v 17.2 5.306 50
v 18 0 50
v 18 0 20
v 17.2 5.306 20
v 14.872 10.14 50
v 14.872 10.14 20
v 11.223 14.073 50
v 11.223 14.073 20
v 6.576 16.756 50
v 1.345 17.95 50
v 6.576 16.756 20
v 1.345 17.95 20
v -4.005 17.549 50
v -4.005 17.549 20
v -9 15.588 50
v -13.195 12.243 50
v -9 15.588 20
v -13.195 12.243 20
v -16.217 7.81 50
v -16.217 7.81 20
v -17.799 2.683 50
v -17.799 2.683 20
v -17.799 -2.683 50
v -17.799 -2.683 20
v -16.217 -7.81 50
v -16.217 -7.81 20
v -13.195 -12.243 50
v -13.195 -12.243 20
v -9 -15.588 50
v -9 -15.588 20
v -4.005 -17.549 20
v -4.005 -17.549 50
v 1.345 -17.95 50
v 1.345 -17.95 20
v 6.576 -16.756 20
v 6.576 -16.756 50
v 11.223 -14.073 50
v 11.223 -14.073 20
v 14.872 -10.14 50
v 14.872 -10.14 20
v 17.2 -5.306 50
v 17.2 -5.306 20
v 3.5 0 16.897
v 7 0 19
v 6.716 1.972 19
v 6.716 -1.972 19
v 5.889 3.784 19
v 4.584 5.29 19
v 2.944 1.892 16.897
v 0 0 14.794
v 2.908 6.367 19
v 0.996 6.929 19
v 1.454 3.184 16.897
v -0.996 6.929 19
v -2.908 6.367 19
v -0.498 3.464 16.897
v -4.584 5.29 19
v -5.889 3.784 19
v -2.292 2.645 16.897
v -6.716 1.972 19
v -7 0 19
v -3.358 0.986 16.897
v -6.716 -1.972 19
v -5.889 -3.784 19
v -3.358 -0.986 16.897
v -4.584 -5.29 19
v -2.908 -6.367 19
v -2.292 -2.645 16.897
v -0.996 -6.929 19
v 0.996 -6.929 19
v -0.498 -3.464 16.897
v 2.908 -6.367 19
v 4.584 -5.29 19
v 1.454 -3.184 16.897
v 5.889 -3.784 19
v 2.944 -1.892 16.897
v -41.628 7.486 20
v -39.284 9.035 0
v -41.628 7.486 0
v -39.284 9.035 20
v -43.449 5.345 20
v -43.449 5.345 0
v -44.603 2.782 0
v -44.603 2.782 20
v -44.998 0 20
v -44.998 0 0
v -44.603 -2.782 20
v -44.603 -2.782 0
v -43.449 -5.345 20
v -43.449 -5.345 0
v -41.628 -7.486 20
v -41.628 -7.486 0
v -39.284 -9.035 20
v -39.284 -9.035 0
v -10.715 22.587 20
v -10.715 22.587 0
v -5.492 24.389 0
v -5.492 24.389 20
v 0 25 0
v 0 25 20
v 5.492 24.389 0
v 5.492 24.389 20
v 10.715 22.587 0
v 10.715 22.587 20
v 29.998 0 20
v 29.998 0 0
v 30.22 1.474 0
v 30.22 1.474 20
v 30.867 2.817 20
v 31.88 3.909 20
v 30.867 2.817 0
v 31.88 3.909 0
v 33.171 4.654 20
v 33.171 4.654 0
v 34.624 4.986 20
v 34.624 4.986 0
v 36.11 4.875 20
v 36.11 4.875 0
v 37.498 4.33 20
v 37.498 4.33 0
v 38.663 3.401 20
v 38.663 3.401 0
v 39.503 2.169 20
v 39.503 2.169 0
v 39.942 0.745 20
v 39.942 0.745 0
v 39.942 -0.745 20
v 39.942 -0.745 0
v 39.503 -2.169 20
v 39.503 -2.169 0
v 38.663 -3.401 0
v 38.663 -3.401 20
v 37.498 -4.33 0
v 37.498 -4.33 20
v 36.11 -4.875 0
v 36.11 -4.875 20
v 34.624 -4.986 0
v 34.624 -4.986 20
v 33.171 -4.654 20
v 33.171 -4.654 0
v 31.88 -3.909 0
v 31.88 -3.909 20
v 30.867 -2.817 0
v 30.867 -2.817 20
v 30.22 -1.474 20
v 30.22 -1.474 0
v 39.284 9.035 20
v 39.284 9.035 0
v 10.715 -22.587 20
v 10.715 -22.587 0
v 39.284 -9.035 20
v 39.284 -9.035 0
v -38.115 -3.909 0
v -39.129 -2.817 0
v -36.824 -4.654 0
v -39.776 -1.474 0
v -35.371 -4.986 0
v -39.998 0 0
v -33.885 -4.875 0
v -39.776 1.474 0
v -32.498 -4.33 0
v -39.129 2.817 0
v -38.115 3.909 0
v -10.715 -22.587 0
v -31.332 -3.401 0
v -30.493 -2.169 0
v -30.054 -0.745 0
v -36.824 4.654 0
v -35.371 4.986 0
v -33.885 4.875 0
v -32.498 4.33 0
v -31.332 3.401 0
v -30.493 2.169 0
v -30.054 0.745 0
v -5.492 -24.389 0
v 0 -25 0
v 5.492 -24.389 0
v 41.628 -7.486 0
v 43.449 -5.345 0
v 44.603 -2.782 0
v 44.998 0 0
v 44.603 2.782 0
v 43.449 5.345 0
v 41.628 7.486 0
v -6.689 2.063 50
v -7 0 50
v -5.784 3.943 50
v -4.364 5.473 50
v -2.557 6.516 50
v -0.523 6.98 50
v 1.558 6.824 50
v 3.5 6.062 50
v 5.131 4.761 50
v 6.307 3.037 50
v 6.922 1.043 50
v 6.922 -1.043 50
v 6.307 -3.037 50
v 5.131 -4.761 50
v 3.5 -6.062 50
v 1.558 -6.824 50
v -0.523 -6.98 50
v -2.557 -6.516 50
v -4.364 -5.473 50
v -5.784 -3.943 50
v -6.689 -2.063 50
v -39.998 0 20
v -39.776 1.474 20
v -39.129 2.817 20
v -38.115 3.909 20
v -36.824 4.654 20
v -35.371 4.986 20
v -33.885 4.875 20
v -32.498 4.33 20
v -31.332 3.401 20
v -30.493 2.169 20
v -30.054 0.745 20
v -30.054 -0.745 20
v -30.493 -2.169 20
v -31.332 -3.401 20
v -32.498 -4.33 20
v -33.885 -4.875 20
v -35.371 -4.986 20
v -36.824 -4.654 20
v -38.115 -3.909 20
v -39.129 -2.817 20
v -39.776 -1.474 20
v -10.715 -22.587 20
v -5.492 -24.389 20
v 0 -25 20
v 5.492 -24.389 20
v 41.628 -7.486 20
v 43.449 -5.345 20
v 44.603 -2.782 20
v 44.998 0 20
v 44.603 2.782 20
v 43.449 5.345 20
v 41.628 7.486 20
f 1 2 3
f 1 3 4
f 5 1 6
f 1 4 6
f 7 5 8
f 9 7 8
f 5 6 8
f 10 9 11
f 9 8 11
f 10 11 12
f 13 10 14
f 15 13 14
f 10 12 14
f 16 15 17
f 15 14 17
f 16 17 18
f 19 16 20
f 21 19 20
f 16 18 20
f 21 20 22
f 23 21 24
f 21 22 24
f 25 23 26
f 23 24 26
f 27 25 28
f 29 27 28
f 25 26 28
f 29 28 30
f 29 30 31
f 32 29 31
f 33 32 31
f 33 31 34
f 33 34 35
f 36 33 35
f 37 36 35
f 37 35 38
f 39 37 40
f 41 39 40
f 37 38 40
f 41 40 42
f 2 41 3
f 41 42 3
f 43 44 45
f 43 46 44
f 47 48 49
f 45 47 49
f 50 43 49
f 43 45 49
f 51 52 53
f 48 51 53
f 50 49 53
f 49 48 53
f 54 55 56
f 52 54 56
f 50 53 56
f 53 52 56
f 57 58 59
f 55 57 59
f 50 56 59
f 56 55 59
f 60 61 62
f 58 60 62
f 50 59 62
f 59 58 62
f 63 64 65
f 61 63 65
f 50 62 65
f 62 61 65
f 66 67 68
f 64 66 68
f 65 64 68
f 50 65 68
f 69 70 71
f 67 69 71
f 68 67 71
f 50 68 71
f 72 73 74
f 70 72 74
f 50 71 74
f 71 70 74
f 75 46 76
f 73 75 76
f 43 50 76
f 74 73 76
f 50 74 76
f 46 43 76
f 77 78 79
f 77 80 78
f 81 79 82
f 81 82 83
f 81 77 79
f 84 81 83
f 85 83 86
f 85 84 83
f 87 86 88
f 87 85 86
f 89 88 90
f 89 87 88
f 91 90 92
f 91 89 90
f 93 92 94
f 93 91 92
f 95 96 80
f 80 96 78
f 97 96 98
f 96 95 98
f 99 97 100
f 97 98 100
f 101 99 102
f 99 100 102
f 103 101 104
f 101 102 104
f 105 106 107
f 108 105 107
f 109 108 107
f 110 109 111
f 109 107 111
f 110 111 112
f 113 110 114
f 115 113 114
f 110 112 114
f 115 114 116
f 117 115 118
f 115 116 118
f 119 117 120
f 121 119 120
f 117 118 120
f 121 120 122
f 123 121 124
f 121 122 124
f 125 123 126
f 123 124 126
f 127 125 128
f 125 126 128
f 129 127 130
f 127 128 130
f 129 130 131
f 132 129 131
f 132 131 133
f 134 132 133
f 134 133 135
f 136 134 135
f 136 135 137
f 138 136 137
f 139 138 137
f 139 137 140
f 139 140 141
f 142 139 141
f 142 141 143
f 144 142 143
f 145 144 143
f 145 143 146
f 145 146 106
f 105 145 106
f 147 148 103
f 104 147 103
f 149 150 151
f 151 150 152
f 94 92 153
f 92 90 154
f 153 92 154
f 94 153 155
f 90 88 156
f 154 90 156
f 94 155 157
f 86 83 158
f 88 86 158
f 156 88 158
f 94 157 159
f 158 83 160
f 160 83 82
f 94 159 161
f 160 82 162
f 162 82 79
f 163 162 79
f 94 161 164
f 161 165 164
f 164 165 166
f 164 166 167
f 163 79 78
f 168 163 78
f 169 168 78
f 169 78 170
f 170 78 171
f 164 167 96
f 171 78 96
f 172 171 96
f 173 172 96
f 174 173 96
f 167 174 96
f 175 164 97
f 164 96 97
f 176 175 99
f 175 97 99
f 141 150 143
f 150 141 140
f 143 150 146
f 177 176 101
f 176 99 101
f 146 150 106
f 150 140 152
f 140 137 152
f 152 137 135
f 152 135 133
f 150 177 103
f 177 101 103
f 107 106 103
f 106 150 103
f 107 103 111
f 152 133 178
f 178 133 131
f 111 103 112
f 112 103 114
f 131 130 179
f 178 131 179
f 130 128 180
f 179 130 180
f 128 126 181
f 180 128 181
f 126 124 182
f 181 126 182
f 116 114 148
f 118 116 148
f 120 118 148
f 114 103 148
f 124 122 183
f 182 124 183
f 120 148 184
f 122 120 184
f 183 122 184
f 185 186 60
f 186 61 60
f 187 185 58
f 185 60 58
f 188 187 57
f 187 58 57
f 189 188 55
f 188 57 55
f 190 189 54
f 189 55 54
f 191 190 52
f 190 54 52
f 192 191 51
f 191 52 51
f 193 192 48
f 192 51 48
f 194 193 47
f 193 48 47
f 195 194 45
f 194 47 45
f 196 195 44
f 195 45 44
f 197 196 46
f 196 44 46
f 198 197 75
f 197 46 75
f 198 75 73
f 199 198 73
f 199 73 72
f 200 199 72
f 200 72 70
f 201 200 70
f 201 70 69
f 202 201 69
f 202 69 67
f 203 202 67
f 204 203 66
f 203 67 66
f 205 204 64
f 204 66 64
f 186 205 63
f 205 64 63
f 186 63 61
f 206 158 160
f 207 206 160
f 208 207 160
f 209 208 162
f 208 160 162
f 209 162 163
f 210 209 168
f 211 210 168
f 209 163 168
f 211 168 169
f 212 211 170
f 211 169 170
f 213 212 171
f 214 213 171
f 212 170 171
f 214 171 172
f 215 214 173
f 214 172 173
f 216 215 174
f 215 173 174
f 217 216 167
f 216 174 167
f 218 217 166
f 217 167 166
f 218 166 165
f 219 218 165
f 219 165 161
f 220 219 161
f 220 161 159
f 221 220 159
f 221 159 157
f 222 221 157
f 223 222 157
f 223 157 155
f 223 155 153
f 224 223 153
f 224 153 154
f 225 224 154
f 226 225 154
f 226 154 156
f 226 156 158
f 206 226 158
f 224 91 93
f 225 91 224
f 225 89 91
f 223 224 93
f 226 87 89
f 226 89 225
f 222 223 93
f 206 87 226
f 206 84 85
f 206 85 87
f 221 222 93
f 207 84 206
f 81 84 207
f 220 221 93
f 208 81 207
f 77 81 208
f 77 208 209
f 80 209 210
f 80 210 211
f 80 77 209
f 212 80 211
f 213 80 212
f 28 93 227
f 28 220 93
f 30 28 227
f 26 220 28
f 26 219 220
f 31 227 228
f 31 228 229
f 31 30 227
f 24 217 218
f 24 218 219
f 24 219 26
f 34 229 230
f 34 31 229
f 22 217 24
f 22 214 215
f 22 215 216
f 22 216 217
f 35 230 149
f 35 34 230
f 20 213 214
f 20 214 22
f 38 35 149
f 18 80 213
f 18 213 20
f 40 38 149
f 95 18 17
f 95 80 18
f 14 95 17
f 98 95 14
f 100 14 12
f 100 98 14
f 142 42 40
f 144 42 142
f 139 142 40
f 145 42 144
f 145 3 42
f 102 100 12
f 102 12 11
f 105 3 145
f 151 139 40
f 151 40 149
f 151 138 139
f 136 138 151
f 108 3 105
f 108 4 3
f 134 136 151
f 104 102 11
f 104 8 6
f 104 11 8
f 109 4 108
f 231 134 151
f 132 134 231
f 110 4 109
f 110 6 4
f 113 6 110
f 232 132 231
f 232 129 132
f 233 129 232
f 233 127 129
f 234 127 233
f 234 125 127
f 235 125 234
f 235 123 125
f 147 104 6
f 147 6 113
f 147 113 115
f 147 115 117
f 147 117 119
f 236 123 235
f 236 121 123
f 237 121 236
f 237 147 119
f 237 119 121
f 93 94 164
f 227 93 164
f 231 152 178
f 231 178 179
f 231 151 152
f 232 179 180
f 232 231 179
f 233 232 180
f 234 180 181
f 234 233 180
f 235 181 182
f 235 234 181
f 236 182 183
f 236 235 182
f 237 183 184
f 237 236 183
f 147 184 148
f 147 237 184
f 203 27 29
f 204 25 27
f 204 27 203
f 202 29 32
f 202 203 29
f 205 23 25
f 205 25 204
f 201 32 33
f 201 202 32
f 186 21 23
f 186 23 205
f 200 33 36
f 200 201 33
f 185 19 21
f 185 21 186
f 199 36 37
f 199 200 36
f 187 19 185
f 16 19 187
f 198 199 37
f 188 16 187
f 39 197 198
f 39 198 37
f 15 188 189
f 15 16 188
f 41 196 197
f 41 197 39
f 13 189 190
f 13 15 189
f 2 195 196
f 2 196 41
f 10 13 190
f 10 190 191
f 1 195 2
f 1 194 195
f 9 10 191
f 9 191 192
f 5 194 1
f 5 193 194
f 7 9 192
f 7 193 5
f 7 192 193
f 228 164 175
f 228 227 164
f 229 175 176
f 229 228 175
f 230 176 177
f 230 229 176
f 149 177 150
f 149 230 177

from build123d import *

# Parameters (mm, degrees)
F1_DEPTH = 20
F2_R     = 10
F3_R     = 25
F5_D     = 10
F6_R     = 18
F7_DEPTH = 30
F9_D     = 14
F9_DEPTH = 31
F9_TIP   = 4.2060243332


with BuildPart() as f1:
    # F0 (on Top) → F1 (new body)
    with BuildSketch(Plane.XY):
        Polygon((0, 27.66993), (-58.33, 0), (0, -27.66993), (58.33, 0), align=None)
    extrude(amount=F1_DEPTH)

    # F2
    f2_edges = [f1.edges().sort_by_distance(p)[0] for p in [
        (-58.33, 0, 10),
        (58.33, 0, 10),
    ]]
    fillet(f2_edges, radius=F2_R)

    # F3
    f3_edges = [f1.edges().sort_by_distance(p)[0] for p in [
        (0, -27.66993, 10),
        (0, 27.66993, 10),
    ]]
    fillet(f3_edges, radius=F3_R)

    # F5 (through all)
    with Locations(Plane.XY.offset(20)):
        with Locations((34.9977554223, 0), (-34.9977554223, 0)):
            Hole(F5_D / 2)

    # F6 (on face) → F7 (join)
    with BuildSketch(Plane.XY.offset(20)):
        Circle(F6_R)
    extrude(amount=F7_DEPTH)

    # F9
    with Locations(Plane.XY.offset(50)):
        with Locations((0, 0)):
            Hole(F9_D / 2, depth=F9_DEPTH)
            with Locations((0, 0, -(F9_DEPTH + F9_TIP / 2))):  # 118° drill point
                Cone(0, F9_D / 2, F9_TIP, mode=Mode.SUBTRACT)


solid = f1.part
